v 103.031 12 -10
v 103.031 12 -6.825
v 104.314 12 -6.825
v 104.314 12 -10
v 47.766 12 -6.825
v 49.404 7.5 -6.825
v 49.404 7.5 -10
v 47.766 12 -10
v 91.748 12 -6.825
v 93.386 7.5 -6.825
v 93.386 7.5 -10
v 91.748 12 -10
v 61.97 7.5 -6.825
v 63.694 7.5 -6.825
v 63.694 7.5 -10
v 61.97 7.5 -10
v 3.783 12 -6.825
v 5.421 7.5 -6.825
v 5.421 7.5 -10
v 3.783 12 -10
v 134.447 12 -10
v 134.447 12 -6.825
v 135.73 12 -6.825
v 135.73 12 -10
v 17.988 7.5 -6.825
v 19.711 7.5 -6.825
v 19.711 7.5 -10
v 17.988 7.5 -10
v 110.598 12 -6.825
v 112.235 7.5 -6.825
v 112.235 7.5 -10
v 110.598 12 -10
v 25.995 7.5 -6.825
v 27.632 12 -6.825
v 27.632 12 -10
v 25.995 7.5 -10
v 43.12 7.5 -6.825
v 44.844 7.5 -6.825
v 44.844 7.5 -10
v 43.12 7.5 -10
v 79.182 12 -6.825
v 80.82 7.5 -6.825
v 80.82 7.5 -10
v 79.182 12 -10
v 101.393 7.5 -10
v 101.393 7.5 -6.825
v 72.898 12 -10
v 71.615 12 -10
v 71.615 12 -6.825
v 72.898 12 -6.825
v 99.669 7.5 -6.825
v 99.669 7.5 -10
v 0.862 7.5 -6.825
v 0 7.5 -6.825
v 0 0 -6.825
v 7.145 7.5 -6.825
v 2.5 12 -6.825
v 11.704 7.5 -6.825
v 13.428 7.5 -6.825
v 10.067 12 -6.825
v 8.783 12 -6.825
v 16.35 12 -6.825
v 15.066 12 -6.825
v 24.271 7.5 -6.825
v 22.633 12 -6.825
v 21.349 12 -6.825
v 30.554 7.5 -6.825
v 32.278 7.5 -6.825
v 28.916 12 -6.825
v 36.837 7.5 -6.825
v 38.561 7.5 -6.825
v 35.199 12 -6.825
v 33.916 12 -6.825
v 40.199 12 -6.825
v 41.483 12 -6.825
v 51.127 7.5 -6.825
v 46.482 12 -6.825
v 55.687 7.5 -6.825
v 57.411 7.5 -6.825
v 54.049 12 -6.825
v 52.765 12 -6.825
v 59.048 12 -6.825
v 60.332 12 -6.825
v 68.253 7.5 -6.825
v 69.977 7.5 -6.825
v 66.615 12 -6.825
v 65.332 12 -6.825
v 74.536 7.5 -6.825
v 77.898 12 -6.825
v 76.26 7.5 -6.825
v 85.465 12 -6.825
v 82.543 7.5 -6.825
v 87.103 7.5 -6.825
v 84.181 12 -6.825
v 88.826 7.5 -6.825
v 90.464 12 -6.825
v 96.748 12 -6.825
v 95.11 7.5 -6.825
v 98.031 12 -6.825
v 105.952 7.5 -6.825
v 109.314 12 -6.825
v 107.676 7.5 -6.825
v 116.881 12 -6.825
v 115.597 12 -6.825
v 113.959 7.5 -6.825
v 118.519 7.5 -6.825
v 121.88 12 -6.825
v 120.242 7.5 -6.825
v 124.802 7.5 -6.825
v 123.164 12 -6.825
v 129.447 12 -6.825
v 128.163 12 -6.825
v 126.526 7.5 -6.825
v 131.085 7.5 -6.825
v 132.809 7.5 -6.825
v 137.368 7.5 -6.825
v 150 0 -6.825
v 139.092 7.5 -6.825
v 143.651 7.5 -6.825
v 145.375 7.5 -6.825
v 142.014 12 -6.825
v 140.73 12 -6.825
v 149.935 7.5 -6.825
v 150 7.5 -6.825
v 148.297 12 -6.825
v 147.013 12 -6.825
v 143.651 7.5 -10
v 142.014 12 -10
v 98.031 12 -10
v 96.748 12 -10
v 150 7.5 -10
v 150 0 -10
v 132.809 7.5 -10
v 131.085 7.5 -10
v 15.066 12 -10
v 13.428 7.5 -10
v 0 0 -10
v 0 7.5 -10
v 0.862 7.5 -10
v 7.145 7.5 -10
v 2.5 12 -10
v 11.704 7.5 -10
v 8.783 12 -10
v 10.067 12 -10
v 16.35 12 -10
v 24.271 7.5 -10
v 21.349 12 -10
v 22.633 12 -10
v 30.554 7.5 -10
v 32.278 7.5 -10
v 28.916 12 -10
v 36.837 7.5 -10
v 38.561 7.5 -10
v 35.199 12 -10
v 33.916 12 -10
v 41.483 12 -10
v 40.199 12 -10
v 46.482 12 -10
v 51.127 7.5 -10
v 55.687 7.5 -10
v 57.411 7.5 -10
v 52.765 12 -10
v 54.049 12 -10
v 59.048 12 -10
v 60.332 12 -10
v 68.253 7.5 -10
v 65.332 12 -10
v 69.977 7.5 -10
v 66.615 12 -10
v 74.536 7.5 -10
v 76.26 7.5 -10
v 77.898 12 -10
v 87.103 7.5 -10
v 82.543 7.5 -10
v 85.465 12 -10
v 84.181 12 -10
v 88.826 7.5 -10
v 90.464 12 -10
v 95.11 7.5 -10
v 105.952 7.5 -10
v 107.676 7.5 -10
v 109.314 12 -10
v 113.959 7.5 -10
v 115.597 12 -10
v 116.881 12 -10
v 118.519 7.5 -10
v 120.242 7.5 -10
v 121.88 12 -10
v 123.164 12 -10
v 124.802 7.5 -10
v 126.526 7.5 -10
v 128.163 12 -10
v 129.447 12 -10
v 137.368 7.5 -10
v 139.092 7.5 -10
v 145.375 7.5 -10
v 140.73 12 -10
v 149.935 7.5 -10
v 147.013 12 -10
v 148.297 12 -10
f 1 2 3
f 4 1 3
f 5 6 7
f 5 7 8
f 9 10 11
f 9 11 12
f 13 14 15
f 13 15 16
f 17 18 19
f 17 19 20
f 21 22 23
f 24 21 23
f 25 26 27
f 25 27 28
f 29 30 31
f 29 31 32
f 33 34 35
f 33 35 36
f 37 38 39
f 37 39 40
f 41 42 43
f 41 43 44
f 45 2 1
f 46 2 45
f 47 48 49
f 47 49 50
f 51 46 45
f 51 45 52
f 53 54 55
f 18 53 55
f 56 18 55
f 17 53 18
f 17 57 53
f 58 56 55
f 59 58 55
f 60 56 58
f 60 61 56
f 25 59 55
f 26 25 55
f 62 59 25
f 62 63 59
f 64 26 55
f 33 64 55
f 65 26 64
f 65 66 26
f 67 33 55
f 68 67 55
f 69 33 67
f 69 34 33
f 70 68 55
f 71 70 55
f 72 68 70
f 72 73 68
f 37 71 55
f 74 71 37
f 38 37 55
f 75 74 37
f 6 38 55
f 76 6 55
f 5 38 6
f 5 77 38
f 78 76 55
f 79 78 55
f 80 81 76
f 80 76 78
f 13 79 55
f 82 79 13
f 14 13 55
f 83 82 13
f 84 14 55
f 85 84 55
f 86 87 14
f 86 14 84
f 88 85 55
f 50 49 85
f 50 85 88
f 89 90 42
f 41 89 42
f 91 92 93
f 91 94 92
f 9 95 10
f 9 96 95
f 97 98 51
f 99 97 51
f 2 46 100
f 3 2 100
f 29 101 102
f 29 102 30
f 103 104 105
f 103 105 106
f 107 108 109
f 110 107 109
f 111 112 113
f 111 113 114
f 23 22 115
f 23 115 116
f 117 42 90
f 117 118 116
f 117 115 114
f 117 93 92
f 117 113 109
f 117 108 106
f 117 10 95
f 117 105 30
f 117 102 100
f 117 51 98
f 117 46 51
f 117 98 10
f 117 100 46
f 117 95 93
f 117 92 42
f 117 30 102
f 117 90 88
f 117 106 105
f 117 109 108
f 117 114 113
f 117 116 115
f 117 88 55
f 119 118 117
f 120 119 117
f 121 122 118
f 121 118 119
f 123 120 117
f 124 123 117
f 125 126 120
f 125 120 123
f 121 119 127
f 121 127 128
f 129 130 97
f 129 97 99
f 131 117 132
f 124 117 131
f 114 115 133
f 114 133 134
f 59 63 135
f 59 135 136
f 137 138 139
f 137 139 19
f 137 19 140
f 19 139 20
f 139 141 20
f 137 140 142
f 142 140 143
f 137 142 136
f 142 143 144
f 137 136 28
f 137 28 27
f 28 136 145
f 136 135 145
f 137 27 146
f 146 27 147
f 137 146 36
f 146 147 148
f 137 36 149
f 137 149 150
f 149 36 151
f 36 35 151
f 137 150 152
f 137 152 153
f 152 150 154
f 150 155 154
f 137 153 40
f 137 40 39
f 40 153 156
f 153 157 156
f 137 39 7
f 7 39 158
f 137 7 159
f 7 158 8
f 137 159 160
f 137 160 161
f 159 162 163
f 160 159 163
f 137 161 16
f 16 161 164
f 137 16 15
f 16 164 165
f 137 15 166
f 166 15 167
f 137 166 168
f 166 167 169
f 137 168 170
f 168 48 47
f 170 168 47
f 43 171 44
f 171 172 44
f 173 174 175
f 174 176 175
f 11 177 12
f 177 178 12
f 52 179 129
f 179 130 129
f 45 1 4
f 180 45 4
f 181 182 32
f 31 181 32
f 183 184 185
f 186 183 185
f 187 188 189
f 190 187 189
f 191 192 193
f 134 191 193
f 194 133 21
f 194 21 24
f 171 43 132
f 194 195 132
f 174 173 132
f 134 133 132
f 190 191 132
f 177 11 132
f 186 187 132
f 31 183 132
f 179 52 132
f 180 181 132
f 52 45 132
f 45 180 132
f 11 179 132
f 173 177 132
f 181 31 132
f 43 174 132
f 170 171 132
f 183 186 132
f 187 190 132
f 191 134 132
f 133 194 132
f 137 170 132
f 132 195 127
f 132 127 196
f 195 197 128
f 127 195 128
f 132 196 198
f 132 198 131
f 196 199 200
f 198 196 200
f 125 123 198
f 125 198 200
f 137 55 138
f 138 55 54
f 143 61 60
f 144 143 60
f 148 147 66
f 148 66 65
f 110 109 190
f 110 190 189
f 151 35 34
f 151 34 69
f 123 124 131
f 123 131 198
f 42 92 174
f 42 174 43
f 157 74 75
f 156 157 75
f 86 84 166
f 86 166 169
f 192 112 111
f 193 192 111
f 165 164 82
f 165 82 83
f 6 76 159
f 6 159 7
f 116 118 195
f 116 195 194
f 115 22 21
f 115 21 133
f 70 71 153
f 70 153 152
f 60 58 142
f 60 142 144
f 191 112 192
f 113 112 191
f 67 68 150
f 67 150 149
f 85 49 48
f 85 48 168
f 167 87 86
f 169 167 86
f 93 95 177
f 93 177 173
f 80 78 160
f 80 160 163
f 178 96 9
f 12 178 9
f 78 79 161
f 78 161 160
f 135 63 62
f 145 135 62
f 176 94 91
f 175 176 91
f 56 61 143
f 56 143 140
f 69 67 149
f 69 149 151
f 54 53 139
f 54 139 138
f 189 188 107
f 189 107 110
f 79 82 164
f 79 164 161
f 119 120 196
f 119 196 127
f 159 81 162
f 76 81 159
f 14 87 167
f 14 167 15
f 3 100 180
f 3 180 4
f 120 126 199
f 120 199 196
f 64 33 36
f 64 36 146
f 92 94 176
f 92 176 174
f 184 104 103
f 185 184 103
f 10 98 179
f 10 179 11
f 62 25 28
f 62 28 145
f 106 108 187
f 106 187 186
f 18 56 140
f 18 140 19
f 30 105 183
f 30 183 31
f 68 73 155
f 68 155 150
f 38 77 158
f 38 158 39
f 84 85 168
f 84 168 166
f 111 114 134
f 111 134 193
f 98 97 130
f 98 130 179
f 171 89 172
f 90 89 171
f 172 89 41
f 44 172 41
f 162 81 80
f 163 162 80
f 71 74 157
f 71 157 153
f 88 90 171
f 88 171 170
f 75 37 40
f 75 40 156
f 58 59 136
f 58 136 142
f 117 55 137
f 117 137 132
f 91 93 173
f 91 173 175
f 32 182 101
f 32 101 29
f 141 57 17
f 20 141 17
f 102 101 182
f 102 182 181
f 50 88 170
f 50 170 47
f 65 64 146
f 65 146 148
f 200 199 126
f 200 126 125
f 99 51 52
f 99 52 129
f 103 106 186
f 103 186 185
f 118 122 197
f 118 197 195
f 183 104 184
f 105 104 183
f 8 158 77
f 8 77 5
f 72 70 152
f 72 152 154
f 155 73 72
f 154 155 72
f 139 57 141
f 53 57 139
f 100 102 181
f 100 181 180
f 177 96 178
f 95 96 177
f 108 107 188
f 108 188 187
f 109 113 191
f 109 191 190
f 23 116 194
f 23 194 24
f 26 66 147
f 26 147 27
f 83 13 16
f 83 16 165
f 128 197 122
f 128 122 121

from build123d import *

# Parameters (mm, degrees)
BLANKSKE_W         = 150
BLANKSKE_H         = 12
BLANK_DEPTH        = 10
TOOTHCUTSIM_DEPTH  = 151.811140172
TEETHCUTS_COUNT    = 25
TEETHCUTS_PITCH    = 6.2831853
CUT_EXTRUDE1_DEPTH = 6.825


with BuildPart() as part:
    # BlankSke → Blank (new body)
    with BuildSketch(Plane.XY):
        with Locations((75, 6)):
            Rectangle(BLANKSKE_W, BLANKSKE_H)
    extrude(amount=-BLANK_DEPTH)

    # TooCutSkeSim → ToothCutSim (cut, through all)
    with BuildSketch(Plane.XY):
        Polygon((0.861870739, 7.5), (-0.861870739, 7.5), (-2.508981637, 12.0254), (2.508981637, 12.0254), align=None)
    toothcutsim = extrude(amount=-TOOTHCUTSIM_DEPTH, mode=Mode.SUBTRACT)

    # TeethCuts: ToothCutSim ×25
    with Locations(*[(i * TEETHCUTS_PITCH, 0, 0) for i in range(1, TEETHCUTS_COUNT)]):
        add(toothcutsim, mode=Mode.SUBTRACT)

    # Sketch1 → Cut-Extrude1 (cut)
    with BuildSketch(Plane.XY):
        Polygon((150, 7.5), (149.934576461, 7.5), (148.296710406, 12), (147.012998694, 12), (145.375132639, 7.5), (143.651391161, 7.5), (142.013525106, 12), (140.729813394, 12), (139.091947339, 7.5), (137.368205861, 7.5), (135.730339806, 12), (134.446628094, 12), (132.808762039, 7.5), (131.085020561, 7.5), (129.447154506, 12), (128.163442794, 12), (126.525576739, 7.5), (124.801835261, 7.5), (123.163969206, 12), (121.880257494, 12), (120.242391439, 7.5), (118.518649961, 7.5), (116.880783906, 12), (115.597072194, 12), (113.959206139, 7.5), (112.235464661, 7.5), (110.597598606, 12), (109.313886894, 12), (107.676020839, 7.5), (105.952279361, 7.5), (104.314413306, 12), (103.030701594, 12), (101.392835539, 7.5), (99.669094061, 7.5), (98.031228006, 12), (96.747516294, 12), (95.109650239, 7.5), (93.385908761, 7.5), (91.748042706, 12), (90.464330994, 12), (88.826464939, 7.5), (87.102723461, 7.5), (85.464857406, 12), (84.181145694, 12), (82.543279639, 7.5), (80.819538161, 7.5), (79.181672106, 12), (77.897960394, 12), (76.260094339, 7.5), (74.536352861, 7.5), (72.898486806, 12), (71.614775094, 12), (69.976909039, 7.5), (68.253167561, 7.5), (66.615301506, 12), (65.331589794, 12), (63.693723739, 7.5), (61.969982261, 7.5), (60.332116206, 12), (59.048404494, 12), (57.410538439, 7.5), (55.686796961, 7.5), (54.048930906, 12), (52.765219194, 12), (51.127353139, 7.5), (49.403611661, 7.5), (47.765745606, 12), (46.482033894, 12), (44.844167839, 7.5), (43.120426361, 7.5), (41.482560306, 12), (40.198848594, 12), (38.560982539, 7.5), (36.837241061, 7.5), (35.199375006, 12), (33.915663294, 12), (32.277797239, 7.5), (30.554055761, 7.5), (28.916189706, 12), (27.632477994, 12), (25.994611939, 7.5), (24.270870461, 7.5), (22.633004406, 12), (21.349292694, 12), (19.711426639, 7.5), (17.987685161, 7.5), (16.349819106, 12), (15.066107394, 12), (13.428241339, 7.5), (11.704499861, 7.5), (10.066633806, 12), (8.782922094, 12), (7.145056039, 7.5), (5.421314561, 7.5), (3.783448506, 12), (2.499736794, 12), (0.861870739, 7.5), (0, 7.5), (0, 0), (150, 0), align=None)
    extrude(amount=-CUT_EXTRUDE1_DEPTH, mode=Mode.SUBTRACT)


solid = part.part
